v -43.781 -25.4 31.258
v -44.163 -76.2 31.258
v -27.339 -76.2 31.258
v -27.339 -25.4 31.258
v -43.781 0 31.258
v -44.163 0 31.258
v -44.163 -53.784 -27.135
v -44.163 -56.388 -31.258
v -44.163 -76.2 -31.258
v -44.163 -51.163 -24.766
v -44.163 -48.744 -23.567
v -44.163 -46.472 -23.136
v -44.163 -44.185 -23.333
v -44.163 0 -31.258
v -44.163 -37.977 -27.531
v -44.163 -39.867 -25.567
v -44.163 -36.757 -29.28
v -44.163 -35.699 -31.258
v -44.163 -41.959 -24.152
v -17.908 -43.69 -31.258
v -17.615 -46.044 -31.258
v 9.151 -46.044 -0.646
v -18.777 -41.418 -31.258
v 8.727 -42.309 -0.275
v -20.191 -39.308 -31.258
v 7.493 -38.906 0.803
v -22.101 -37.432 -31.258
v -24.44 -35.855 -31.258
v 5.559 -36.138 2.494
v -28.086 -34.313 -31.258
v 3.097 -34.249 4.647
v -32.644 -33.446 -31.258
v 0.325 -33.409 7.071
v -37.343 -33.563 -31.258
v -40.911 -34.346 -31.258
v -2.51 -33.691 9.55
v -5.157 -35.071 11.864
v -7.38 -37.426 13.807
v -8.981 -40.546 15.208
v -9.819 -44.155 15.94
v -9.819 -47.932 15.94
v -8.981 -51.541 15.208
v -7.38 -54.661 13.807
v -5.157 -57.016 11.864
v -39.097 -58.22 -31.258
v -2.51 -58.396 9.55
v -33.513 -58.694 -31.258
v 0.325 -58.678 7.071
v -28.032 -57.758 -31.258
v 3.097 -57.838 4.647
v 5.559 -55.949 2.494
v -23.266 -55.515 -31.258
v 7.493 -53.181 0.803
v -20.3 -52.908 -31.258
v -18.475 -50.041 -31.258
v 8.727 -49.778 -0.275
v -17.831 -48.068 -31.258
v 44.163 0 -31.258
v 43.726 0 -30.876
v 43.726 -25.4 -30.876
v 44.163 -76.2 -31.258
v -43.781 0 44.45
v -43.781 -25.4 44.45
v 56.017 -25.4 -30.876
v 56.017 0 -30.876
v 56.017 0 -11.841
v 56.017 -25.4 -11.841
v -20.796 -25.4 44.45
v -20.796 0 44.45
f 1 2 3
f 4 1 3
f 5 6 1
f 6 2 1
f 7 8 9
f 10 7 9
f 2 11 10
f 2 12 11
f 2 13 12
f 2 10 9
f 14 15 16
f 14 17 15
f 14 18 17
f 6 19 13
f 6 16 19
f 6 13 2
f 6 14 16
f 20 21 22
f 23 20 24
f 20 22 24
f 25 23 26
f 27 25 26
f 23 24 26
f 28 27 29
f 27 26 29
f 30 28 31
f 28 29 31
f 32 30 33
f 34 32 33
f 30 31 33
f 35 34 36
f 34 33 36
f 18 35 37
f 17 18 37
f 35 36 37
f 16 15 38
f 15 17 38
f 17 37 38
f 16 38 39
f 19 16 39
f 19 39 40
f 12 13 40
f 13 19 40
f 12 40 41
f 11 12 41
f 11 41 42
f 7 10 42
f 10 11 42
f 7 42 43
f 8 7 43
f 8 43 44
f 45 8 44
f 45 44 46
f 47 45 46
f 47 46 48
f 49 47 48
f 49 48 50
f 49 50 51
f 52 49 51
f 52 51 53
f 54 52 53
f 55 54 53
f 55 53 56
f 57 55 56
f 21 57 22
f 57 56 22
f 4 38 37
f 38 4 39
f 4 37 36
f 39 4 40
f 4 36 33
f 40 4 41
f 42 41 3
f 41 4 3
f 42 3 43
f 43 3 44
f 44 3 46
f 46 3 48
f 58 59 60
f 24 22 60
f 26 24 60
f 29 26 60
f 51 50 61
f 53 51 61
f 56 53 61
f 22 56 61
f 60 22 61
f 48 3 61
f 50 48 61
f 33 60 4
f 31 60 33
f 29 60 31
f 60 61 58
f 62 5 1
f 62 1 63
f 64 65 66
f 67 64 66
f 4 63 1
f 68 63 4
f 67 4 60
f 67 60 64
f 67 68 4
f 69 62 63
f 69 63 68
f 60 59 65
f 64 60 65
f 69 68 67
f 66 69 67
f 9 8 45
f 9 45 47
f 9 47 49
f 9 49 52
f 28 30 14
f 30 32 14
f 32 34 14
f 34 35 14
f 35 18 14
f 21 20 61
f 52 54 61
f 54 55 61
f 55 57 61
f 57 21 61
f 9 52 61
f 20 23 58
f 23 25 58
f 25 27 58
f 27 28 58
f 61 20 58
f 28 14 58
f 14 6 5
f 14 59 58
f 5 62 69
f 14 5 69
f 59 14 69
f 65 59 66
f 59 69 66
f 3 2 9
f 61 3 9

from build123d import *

# Parameters (mm, degrees)
F0_W     = 88.3264541626
F0_H     = 62.5167712569
F1_DEPTH = 76.2
F3_DEPTH = 76.201
F4_R     = 12.6699231952
F5_DEPTH = 58.1391964974
F6_W     = 99.7974202037
F6_H     = 75.3260236233
F7_DEPTH = 25.4
F9_DEPTH = 25.401


with BuildPart() as f1:
    # F0 (on Front) → F1 (new body)
    with BuildSketch(Plane.XZ):
        Rectangle(F0_W, F0_H)
    extrude(amount=F1_DEPTH)

    # F2 (on face) → F3 (cut, through all)
    with BuildSketch(Plane.XZ.offset(76.2)):
        Polygon((44.1632270813, 31.2583856285), (-27.3391399533, 31.2583856285), (44.1632270813, -31.2583856285), align=None)
    extrude(amount=-F3_DEPTH, mode=Mode.SUBTRACT)

    # F4 (on face) → F5 (cut, through all)
    with BuildSketch(Plane(origin=(3.6445426056, 0, 4.1683762265), x_dir=(0.752826049, 0, -0.6582195227), z_dir=(0.6582195227, 0, 0.752826049))):
        with Locations((-5.3561865352, -46.0435785353)):
            Circle(F4_R)
    extrude(amount=-F5_DEPTH, mode=Mode.SUBTRACT)

    # F6 (on Front) → F7 (join)
    with BuildSketch(Plane.XZ):
        with Locations((6.1178505421, 6.7869918421)):
            Rectangle(F6_W, F6_H)
    extrude(amount=F7_DEPTH)

    # F8 (on face) → F9 (cut, through all)
    with BuildSketch(Plane.XZ.offset(25.4)):
        Polygon((56.0165606439, 44.4500036538), (-20.7964573056, 44.4500036538), (56.0165606439, -11.8411714114), align=None)
    extrude(amount=-F9_DEPTH, mode=Mode.SUBTRACT)


solid = f1.part
